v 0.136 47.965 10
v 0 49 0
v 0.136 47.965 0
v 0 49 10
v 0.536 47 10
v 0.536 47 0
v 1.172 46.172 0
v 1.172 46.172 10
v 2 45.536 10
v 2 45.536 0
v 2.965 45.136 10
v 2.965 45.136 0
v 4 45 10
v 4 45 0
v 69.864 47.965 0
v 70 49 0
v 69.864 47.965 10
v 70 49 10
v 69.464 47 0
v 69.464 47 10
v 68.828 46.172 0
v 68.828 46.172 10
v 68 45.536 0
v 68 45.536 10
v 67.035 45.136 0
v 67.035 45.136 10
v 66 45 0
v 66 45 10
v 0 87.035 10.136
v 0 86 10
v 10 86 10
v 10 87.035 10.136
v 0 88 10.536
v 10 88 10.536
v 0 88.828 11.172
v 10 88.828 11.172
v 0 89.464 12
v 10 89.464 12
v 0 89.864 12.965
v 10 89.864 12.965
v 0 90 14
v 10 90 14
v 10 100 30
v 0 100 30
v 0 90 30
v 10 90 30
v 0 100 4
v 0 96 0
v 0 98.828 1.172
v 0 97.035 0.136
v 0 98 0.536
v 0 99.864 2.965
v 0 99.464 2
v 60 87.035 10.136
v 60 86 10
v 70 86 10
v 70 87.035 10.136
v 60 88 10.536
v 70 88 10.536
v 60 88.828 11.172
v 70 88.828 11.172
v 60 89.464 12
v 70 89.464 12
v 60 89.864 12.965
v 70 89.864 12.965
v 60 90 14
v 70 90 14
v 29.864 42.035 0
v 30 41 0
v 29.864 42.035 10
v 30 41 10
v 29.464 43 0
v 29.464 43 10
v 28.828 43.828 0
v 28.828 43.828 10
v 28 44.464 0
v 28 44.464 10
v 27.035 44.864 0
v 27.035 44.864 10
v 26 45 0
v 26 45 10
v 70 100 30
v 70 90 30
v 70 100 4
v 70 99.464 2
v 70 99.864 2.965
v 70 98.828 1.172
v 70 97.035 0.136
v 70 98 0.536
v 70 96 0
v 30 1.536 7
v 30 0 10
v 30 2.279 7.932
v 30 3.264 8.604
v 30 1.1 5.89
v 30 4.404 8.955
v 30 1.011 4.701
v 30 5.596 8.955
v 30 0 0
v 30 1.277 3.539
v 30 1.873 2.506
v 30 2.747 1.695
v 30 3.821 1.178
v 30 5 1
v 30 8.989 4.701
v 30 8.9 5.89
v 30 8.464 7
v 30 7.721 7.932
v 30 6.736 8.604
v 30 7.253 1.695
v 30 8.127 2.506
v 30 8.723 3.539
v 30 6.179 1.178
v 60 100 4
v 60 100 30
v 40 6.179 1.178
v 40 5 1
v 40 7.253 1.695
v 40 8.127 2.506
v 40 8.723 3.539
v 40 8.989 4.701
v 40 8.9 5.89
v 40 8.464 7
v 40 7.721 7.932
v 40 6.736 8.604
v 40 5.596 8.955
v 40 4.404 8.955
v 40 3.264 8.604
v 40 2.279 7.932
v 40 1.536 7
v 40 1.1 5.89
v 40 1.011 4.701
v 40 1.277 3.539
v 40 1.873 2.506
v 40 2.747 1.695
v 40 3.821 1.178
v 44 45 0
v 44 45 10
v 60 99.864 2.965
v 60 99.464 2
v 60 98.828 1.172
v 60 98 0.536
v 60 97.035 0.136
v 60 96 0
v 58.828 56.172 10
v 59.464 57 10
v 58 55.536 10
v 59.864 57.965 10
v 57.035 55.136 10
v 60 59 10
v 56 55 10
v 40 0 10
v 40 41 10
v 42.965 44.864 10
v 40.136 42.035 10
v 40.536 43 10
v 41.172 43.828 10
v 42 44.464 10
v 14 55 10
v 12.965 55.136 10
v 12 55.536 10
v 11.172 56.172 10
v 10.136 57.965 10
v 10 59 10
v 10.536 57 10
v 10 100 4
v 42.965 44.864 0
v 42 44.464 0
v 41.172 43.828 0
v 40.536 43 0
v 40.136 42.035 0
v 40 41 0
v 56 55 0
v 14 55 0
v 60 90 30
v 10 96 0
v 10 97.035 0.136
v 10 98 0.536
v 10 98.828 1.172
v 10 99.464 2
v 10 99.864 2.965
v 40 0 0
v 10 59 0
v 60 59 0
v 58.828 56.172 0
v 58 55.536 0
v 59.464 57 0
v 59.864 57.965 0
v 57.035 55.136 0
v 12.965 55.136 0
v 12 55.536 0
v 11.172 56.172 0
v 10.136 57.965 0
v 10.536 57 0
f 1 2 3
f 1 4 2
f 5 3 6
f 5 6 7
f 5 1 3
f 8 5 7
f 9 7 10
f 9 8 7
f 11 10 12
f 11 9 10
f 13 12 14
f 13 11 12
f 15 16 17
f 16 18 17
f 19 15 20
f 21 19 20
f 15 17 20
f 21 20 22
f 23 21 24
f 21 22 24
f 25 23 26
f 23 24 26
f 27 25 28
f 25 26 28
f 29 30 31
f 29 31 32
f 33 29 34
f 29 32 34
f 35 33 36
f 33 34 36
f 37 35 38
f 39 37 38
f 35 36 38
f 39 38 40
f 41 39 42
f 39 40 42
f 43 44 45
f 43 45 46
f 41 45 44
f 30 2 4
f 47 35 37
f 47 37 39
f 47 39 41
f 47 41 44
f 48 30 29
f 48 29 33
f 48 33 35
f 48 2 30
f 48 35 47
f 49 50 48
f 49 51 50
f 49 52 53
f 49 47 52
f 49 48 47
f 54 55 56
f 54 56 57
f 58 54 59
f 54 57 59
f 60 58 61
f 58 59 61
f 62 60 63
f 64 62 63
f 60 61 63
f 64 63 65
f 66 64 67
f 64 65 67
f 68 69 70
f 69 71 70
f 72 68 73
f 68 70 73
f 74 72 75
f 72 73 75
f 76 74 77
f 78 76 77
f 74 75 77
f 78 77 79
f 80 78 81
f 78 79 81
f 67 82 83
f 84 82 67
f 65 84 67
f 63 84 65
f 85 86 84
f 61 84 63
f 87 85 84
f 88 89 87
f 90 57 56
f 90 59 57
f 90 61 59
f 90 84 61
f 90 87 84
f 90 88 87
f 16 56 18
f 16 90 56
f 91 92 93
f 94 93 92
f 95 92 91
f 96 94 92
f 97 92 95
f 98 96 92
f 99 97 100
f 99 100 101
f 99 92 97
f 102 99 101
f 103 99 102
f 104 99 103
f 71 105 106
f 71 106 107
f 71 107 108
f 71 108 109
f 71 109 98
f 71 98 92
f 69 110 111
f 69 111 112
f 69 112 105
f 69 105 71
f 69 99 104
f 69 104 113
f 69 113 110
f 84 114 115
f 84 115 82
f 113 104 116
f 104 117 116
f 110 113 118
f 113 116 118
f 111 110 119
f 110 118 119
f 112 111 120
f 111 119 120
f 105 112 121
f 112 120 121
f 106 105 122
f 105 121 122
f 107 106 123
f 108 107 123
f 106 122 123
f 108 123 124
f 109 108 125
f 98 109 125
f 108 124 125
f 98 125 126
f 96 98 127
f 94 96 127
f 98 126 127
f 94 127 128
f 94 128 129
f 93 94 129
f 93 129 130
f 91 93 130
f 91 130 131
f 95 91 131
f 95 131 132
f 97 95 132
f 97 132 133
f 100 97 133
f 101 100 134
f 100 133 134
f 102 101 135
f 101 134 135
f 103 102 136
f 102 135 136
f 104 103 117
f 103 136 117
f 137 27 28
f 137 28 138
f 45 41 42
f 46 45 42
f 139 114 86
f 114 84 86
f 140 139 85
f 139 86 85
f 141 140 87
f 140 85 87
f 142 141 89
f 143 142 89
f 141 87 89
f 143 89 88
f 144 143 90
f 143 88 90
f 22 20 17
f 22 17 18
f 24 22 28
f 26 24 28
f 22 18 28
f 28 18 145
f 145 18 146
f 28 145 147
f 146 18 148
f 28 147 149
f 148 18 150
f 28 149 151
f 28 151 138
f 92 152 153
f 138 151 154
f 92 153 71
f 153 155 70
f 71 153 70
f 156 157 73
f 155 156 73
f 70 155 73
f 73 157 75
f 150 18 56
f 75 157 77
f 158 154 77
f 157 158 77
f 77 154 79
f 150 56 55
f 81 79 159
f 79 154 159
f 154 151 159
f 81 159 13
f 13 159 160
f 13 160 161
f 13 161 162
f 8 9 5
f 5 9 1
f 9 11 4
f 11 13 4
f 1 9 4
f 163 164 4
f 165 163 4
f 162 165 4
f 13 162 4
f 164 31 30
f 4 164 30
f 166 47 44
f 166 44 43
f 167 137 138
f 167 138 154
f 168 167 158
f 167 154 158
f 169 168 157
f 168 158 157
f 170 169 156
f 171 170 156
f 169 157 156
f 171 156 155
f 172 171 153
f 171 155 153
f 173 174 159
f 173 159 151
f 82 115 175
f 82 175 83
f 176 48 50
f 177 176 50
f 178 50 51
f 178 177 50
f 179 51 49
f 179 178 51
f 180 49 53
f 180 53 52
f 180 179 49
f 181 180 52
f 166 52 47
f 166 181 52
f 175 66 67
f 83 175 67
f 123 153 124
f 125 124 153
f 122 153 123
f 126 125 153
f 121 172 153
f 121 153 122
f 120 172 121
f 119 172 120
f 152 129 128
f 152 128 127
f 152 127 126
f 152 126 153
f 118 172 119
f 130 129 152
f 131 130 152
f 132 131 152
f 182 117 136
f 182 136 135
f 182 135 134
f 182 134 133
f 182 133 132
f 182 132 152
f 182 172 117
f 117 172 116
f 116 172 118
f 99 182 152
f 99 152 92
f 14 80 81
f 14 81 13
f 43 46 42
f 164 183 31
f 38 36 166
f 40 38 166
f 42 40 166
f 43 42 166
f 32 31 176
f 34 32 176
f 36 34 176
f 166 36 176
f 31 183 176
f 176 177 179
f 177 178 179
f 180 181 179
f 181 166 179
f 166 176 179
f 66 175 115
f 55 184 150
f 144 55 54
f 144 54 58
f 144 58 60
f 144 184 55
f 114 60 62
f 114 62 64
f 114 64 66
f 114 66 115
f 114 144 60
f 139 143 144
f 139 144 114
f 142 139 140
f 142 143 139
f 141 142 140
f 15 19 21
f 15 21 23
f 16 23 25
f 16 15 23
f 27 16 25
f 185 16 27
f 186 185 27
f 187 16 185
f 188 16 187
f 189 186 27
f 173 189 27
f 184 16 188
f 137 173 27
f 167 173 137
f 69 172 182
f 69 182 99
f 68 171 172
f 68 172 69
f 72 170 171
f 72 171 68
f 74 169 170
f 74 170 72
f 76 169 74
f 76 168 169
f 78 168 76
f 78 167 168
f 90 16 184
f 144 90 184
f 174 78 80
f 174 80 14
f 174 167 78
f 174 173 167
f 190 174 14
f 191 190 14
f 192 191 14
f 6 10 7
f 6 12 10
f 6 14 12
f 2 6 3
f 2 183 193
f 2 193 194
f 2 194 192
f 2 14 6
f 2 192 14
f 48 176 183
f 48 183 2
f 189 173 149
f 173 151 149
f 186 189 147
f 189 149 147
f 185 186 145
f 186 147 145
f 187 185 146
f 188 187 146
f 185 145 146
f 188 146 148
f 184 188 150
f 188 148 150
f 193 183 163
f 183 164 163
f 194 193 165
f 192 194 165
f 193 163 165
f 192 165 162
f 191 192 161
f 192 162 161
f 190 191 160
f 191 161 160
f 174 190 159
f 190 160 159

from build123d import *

# Parameters (mm, degrees)
BOSS_EXTRU_1_DEPTH                = 10
ESQUISSE2_W                       = 10
ESQUISSE2_H                       = 10
BOSS_EXTRU_2_DEPTH                = 20
DIAM_TRE_DU_PER_AGE_8_0_8_1_D     = 8
DIAM_TRE_DU_PER_AGE_8_0_8_1_DEPTH = 10
DIAM_TRE_DU_PER_AGE_8_0_8_1_TIP   = 2.403442476
CONG_1_R                          = 4


with BuildPart() as part:
    # Esquisse1 → Boss.-Extru.1 (new body)
    with BuildSketch(Plane.XY):
        Polygon((30, 0), (30, 45), (0, 45), (0, 100), (10, 100), (10, 55), (60, 55), (60, 100), (70, 100), (70, 45), (40, 45), (40, 0), align=None)
    extrude(amount=BOSS_EXTRU_1_DEPTH)

    # Esquisse2 → Boss.-Extru.2 (add)
    with BuildSketch(Plane.XY.offset(10)):
        with Locations((5, 95)):
            Rectangle(ESQUISSE2_W, ESQUISSE2_H)
        with Locations((65, 95)):
            Rectangle(ESQUISSE2_W, ESQUISSE2_H)
    extrude(amount=BOSS_EXTRU_2_DEPTH)

    # Diamètre du perçage Ø8.0 (8)1
    with Locations(Plane.ZY.offset(-30)):
        with Locations((5, 5)):
            Hole(DIAM_TRE_DU_PER_AGE_8_0_8_1_D / 2, depth=DIAM_TRE_DU_PER_AGE_8_0_8_1_DEPTH)
            with Locations((0, 0, -(DIAM_TRE_DU_PER_AGE_8_0_8_1_DEPTH + DIAM_TRE_DU_PER_AGE_8_0_8_1_TIP / 2))):  # 118° drill point
                Cone(0, DIAM_TRE_DU_PER_AGE_8_0_8_1_D / 2, DIAM_TRE_DU_PER_AGE_8_0_8_1_TIP, mode=Mode.SUBTRACT)

    # Congé1
    cong_1_edges = [part.edges().sort_by_distance(p)[0] for p in [
        (5, 100, 0),
        (65, 100, 0),
        (70, 45, 5),
        (40, 45, 5),
        (30, 45, 5),
        (0, 45, 5),
        (10, 55, 5),
        (60, 55, 5),
        (5, 90, 10),
        (65, 90, 10),
    ]]
    fillet(cong_1_edges, radius=CONG_1_R)


solid = part.part
